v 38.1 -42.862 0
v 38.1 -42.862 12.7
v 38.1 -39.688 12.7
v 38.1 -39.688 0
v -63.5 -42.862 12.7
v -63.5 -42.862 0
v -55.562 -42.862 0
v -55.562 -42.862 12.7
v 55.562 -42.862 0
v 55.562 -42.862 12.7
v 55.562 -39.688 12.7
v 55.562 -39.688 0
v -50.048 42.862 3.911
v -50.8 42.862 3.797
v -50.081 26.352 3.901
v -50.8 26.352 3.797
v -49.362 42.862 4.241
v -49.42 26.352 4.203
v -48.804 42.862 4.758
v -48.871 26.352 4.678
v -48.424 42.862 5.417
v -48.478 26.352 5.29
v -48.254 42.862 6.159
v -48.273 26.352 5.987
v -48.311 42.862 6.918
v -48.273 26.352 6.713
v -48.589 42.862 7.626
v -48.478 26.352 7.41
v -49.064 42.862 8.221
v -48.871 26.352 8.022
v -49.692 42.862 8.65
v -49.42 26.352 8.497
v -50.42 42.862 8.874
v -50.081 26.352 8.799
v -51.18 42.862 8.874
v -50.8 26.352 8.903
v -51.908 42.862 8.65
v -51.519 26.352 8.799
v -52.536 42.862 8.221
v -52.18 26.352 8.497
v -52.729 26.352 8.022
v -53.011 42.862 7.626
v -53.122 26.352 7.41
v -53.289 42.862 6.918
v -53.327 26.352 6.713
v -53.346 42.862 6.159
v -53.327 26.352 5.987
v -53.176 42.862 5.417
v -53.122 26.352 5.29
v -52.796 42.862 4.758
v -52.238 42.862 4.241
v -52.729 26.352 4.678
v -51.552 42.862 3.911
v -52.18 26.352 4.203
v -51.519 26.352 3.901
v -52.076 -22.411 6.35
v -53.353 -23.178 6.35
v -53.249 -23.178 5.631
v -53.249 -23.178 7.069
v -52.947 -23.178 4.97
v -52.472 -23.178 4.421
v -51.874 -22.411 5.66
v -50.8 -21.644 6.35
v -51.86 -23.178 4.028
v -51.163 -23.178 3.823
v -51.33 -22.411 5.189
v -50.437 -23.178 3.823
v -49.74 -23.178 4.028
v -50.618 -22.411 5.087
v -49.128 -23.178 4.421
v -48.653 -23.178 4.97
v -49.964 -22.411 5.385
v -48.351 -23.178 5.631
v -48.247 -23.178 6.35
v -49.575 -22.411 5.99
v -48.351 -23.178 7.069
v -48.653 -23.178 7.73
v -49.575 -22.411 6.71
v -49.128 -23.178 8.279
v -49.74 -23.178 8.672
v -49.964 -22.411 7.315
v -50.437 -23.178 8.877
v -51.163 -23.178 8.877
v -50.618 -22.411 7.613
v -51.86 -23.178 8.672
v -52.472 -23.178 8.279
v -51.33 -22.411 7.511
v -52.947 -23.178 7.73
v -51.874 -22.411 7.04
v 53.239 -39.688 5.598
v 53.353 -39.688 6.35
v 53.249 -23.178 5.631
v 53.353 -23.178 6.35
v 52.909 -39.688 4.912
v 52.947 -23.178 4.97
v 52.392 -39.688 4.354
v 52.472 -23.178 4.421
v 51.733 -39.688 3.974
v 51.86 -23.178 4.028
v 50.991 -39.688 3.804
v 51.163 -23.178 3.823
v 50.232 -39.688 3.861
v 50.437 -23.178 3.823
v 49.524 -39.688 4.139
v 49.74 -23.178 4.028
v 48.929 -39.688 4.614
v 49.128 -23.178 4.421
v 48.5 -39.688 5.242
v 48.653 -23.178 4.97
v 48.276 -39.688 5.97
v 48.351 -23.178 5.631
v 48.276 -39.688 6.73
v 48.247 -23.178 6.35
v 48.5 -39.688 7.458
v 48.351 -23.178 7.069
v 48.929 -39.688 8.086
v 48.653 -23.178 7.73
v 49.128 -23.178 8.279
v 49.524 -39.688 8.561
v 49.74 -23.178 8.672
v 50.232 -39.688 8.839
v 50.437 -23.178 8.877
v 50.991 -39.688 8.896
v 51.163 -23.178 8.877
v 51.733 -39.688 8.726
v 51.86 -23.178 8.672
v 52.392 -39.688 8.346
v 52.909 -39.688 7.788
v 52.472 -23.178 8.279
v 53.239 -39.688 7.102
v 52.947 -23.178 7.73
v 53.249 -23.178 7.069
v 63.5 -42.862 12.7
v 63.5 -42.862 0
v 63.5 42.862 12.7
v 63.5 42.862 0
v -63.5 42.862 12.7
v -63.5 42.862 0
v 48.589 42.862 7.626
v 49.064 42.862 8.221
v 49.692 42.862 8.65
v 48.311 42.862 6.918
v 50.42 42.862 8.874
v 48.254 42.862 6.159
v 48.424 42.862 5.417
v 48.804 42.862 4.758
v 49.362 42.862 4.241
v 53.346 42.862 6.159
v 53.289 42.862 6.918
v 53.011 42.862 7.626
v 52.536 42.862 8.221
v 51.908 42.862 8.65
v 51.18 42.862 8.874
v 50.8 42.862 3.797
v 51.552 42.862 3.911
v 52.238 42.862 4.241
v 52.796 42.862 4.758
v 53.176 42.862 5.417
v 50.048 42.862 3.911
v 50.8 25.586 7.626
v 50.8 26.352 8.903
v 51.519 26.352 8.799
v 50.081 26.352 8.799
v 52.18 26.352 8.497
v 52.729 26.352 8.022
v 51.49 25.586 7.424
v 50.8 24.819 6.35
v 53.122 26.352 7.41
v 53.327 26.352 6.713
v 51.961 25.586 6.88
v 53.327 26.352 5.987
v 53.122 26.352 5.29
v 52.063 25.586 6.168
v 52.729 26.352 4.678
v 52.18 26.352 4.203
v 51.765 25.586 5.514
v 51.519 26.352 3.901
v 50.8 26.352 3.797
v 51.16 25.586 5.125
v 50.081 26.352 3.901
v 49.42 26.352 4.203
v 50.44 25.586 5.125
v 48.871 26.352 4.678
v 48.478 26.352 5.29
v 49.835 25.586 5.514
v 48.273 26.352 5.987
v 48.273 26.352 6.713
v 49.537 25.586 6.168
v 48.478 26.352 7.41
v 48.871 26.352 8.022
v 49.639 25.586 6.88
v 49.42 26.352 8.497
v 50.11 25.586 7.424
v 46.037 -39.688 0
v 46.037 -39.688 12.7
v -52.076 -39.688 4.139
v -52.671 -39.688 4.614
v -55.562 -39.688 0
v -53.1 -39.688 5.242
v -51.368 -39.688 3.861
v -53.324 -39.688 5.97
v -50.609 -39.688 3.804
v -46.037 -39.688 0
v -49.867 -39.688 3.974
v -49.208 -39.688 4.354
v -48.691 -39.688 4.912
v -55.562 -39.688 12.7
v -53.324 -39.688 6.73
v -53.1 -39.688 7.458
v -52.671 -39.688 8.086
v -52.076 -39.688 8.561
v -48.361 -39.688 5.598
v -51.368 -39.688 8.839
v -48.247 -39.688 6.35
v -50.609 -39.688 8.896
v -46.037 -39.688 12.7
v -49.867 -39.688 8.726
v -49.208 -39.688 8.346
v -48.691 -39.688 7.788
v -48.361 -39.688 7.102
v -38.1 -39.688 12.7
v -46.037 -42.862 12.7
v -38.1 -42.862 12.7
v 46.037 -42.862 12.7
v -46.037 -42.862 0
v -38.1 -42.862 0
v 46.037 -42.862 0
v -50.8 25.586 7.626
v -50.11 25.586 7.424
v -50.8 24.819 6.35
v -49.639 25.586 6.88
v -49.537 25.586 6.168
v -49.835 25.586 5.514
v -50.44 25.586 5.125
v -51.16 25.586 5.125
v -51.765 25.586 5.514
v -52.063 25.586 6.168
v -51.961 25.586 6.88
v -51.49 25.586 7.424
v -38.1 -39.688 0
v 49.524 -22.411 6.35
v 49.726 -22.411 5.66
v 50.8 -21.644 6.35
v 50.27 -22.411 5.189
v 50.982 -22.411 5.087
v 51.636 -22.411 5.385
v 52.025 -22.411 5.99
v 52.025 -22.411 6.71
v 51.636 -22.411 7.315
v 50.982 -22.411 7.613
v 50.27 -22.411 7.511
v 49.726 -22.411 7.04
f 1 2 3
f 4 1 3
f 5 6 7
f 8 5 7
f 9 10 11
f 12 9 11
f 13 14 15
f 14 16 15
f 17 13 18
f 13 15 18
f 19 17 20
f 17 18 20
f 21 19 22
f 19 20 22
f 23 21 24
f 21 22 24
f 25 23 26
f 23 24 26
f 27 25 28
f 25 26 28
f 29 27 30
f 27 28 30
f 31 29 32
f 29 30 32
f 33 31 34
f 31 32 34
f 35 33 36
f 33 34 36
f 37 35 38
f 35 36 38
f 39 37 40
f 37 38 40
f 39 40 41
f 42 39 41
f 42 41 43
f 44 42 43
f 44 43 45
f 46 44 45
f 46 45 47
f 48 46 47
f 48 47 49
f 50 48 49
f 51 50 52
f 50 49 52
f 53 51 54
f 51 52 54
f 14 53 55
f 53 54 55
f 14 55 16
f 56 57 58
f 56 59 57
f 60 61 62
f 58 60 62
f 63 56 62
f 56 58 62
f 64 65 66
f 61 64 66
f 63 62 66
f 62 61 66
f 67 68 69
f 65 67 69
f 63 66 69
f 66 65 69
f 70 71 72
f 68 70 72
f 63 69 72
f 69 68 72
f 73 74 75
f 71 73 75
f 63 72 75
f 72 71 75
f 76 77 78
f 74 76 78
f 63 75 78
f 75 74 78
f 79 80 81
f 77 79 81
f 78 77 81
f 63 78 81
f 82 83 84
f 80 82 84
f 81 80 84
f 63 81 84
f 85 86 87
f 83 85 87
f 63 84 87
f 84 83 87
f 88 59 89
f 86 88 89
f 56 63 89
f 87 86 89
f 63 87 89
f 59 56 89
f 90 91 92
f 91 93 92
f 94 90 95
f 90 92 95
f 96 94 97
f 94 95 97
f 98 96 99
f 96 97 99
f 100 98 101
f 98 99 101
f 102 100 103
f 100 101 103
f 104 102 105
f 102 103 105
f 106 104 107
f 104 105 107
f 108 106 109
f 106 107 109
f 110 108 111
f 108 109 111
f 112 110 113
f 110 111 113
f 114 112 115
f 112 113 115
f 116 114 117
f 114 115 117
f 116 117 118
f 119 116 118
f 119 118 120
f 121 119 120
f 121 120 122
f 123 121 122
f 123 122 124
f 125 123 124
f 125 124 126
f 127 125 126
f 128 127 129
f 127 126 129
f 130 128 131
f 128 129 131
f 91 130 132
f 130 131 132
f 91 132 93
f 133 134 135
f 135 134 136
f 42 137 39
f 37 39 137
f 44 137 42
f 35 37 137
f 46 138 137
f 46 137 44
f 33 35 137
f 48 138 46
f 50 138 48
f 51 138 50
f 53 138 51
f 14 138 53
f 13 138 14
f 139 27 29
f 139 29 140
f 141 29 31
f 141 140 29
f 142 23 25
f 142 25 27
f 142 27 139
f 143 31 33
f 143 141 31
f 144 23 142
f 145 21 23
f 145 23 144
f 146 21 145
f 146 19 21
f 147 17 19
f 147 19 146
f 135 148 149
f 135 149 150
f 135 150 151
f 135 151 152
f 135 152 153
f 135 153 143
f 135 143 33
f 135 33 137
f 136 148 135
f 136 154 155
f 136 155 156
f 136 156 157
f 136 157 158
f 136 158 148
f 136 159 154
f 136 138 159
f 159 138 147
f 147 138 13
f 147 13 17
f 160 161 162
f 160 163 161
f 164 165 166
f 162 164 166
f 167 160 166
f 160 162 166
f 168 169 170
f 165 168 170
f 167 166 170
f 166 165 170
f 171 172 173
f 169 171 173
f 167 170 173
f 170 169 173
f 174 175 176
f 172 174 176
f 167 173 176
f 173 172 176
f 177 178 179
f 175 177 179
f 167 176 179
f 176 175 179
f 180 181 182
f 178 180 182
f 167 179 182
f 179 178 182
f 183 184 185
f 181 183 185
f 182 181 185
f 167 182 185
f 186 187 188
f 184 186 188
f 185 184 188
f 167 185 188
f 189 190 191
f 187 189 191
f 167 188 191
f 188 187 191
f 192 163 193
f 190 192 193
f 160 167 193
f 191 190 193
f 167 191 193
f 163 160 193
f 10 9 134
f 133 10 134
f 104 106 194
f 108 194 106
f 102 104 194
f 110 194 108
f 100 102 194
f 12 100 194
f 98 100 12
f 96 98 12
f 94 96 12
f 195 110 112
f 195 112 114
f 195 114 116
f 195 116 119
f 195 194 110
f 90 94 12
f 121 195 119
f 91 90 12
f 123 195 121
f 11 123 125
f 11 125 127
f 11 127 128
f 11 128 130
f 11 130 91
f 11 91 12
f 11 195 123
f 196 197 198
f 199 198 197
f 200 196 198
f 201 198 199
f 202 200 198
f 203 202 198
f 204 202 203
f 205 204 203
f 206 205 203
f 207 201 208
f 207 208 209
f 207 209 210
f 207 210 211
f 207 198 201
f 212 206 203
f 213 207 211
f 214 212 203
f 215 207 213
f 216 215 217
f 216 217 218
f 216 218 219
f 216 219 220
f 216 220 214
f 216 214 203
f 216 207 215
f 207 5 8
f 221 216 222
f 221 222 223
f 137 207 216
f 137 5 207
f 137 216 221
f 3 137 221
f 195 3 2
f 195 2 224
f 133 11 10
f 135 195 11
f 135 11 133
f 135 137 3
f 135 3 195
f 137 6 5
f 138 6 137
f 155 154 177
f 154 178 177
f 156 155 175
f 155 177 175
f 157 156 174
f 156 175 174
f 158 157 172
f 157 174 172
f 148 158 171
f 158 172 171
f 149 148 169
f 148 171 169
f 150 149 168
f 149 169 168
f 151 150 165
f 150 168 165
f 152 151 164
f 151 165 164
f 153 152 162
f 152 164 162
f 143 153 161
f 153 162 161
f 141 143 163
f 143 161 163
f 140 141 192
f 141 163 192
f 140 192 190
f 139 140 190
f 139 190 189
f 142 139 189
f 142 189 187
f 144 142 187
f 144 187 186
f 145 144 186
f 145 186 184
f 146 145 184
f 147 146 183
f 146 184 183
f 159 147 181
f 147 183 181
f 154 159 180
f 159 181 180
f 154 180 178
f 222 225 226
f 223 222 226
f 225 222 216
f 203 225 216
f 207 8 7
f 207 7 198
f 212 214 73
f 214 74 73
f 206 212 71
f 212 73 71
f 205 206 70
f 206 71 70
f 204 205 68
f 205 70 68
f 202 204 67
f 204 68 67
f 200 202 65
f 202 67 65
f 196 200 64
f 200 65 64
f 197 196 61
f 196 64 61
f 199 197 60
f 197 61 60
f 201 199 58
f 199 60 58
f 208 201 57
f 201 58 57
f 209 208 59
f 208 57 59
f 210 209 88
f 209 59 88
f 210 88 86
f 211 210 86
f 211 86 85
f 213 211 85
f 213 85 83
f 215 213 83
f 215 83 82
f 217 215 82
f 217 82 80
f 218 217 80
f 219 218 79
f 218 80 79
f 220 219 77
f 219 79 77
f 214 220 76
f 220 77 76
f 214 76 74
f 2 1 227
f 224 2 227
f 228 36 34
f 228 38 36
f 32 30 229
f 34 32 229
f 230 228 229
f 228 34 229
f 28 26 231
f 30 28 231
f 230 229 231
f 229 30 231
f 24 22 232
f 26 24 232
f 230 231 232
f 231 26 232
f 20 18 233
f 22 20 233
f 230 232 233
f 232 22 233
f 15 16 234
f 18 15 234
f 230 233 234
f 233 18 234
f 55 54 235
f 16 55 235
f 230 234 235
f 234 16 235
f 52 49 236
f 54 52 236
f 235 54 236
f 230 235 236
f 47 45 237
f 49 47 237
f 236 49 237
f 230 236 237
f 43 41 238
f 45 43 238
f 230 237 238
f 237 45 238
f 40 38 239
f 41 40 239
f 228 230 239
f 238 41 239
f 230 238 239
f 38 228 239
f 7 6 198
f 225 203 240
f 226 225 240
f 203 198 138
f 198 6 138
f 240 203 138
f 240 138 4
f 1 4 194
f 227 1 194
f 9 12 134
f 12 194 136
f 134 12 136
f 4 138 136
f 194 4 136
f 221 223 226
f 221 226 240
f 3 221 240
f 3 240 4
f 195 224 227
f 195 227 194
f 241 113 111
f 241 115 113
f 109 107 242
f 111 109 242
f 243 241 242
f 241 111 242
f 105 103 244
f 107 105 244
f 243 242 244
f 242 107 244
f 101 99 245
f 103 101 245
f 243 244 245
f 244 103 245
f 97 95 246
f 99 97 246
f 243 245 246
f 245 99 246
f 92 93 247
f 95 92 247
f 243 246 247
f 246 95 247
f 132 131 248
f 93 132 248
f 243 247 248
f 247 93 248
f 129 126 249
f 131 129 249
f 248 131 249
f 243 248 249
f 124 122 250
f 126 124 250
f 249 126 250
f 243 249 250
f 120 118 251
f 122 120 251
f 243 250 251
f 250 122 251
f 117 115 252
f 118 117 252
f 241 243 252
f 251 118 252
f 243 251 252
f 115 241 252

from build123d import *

# Parameters (mm, degrees)
SKETCH1_W                   = 127
SKETCH1_H                   = 85.725
BOSS_EXTRUDE1_DEPTH         = 12.7
SKETCH2_W                   = 76.2
SKETCH2_H                   = 3.175
CUT_EXTRUDE1_DEPTH          = 78.657800035
SKETCH14_W                  = 9.525
SKETCH14_H                  = 3.175
CUT_EXTRUDE2_DEPTH          = 78.657800035
F_1_4_20_TAPPED_HOLE1_D     = 5.1054
F_1_4_20_TAPPED_HOLE1_DEPTH = 16.51
F_1_4_20_TAPPED_HOLE1_TIP   = 1.533816902
F_1_4_20_TAPPED_HOLE2_D     = 5.1054
F_1_4_20_TAPPED_HOLE2_DEPTH = 16.51
F_1_4_20_TAPPED_HOLE2_TIP   = 1.533816902


with BuildPart() as part:
    # Sketch1 → Boss-Extrude1 (new body)
    with BuildSketch(Plane.XY):
        Rectangle(SKETCH1_W, SKETCH1_H)
    extrude(amount=BOSS_EXTRUDE1_DEPTH)

    # Sketch2 → Cut-Extrude1 (cut, through all)
    with BuildSketch(Plane.XY.offset(12.7)):
        with Locations((0, -41.275)):
            Rectangle(SKETCH2_W, SKETCH2_H)
    extrude(amount=-CUT_EXTRUDE1_DEPTH, mode=Mode.SUBTRACT)

    # Sketch14 → Cut-Extrude2 (cut, through all)
    with BuildSketch(Plane.XY.offset(12.7)):
        with Locations((50.8, -41.275)):
            Rectangle(SKETCH14_W, SKETCH14_H)
        with Locations((-50.8, -41.275)):
            Rectangle(SKETCH14_W, SKETCH14_H)
    extrude(amount=-CUT_EXTRUDE2_DEPTH, mode=Mode.SUBTRACT)

    # 1/4-20 Tapped Hole1
    with Locations(Plane(origin=(-50.8, -39.6875, 6.35), x_dir=(-1, 0, 0), z_dir=(0, -1, 0))):
        with Locations((0, 0), (-101.6, 0)):
            Hole(F_1_4_20_TAPPED_HOLE1_D / 2, depth=F_1_4_20_TAPPED_HOLE1_DEPTH)
            with Locations((0, 0, -(F_1_4_20_TAPPED_HOLE1_DEPTH + F_1_4_20_TAPPED_HOLE1_TIP / 2))):  # 118° drill point
                Cone(0, F_1_4_20_TAPPED_HOLE1_D / 2, F_1_4_20_TAPPED_HOLE1_TIP, mode=Mode.SUBTRACT)

    # 1/4-20 Tapped Hole2
    with Locations(Plane(origin=(-50.8, 42.8625, 6.35), x_dir=(0, 0, 1), z_dir=(0, 1, 0))):
        with Locations((0, 0), (0, 101.6)):
            Hole(F_1_4_20_TAPPED_HOLE2_D / 2, depth=F_1_4_20_TAPPED_HOLE2_DEPTH)
            with Locations((0, 0, -(F_1_4_20_TAPPED_HOLE2_DEPTH + F_1_4_20_TAPPED_HOLE2_TIP / 2))):  # 118° drill point
                Cone(0, F_1_4_20_TAPPED_HOLE2_D / 2, F_1_4_20_TAPPED_HOLE2_TIP, mode=Mode.SUBTRACT)


solid = part.part
